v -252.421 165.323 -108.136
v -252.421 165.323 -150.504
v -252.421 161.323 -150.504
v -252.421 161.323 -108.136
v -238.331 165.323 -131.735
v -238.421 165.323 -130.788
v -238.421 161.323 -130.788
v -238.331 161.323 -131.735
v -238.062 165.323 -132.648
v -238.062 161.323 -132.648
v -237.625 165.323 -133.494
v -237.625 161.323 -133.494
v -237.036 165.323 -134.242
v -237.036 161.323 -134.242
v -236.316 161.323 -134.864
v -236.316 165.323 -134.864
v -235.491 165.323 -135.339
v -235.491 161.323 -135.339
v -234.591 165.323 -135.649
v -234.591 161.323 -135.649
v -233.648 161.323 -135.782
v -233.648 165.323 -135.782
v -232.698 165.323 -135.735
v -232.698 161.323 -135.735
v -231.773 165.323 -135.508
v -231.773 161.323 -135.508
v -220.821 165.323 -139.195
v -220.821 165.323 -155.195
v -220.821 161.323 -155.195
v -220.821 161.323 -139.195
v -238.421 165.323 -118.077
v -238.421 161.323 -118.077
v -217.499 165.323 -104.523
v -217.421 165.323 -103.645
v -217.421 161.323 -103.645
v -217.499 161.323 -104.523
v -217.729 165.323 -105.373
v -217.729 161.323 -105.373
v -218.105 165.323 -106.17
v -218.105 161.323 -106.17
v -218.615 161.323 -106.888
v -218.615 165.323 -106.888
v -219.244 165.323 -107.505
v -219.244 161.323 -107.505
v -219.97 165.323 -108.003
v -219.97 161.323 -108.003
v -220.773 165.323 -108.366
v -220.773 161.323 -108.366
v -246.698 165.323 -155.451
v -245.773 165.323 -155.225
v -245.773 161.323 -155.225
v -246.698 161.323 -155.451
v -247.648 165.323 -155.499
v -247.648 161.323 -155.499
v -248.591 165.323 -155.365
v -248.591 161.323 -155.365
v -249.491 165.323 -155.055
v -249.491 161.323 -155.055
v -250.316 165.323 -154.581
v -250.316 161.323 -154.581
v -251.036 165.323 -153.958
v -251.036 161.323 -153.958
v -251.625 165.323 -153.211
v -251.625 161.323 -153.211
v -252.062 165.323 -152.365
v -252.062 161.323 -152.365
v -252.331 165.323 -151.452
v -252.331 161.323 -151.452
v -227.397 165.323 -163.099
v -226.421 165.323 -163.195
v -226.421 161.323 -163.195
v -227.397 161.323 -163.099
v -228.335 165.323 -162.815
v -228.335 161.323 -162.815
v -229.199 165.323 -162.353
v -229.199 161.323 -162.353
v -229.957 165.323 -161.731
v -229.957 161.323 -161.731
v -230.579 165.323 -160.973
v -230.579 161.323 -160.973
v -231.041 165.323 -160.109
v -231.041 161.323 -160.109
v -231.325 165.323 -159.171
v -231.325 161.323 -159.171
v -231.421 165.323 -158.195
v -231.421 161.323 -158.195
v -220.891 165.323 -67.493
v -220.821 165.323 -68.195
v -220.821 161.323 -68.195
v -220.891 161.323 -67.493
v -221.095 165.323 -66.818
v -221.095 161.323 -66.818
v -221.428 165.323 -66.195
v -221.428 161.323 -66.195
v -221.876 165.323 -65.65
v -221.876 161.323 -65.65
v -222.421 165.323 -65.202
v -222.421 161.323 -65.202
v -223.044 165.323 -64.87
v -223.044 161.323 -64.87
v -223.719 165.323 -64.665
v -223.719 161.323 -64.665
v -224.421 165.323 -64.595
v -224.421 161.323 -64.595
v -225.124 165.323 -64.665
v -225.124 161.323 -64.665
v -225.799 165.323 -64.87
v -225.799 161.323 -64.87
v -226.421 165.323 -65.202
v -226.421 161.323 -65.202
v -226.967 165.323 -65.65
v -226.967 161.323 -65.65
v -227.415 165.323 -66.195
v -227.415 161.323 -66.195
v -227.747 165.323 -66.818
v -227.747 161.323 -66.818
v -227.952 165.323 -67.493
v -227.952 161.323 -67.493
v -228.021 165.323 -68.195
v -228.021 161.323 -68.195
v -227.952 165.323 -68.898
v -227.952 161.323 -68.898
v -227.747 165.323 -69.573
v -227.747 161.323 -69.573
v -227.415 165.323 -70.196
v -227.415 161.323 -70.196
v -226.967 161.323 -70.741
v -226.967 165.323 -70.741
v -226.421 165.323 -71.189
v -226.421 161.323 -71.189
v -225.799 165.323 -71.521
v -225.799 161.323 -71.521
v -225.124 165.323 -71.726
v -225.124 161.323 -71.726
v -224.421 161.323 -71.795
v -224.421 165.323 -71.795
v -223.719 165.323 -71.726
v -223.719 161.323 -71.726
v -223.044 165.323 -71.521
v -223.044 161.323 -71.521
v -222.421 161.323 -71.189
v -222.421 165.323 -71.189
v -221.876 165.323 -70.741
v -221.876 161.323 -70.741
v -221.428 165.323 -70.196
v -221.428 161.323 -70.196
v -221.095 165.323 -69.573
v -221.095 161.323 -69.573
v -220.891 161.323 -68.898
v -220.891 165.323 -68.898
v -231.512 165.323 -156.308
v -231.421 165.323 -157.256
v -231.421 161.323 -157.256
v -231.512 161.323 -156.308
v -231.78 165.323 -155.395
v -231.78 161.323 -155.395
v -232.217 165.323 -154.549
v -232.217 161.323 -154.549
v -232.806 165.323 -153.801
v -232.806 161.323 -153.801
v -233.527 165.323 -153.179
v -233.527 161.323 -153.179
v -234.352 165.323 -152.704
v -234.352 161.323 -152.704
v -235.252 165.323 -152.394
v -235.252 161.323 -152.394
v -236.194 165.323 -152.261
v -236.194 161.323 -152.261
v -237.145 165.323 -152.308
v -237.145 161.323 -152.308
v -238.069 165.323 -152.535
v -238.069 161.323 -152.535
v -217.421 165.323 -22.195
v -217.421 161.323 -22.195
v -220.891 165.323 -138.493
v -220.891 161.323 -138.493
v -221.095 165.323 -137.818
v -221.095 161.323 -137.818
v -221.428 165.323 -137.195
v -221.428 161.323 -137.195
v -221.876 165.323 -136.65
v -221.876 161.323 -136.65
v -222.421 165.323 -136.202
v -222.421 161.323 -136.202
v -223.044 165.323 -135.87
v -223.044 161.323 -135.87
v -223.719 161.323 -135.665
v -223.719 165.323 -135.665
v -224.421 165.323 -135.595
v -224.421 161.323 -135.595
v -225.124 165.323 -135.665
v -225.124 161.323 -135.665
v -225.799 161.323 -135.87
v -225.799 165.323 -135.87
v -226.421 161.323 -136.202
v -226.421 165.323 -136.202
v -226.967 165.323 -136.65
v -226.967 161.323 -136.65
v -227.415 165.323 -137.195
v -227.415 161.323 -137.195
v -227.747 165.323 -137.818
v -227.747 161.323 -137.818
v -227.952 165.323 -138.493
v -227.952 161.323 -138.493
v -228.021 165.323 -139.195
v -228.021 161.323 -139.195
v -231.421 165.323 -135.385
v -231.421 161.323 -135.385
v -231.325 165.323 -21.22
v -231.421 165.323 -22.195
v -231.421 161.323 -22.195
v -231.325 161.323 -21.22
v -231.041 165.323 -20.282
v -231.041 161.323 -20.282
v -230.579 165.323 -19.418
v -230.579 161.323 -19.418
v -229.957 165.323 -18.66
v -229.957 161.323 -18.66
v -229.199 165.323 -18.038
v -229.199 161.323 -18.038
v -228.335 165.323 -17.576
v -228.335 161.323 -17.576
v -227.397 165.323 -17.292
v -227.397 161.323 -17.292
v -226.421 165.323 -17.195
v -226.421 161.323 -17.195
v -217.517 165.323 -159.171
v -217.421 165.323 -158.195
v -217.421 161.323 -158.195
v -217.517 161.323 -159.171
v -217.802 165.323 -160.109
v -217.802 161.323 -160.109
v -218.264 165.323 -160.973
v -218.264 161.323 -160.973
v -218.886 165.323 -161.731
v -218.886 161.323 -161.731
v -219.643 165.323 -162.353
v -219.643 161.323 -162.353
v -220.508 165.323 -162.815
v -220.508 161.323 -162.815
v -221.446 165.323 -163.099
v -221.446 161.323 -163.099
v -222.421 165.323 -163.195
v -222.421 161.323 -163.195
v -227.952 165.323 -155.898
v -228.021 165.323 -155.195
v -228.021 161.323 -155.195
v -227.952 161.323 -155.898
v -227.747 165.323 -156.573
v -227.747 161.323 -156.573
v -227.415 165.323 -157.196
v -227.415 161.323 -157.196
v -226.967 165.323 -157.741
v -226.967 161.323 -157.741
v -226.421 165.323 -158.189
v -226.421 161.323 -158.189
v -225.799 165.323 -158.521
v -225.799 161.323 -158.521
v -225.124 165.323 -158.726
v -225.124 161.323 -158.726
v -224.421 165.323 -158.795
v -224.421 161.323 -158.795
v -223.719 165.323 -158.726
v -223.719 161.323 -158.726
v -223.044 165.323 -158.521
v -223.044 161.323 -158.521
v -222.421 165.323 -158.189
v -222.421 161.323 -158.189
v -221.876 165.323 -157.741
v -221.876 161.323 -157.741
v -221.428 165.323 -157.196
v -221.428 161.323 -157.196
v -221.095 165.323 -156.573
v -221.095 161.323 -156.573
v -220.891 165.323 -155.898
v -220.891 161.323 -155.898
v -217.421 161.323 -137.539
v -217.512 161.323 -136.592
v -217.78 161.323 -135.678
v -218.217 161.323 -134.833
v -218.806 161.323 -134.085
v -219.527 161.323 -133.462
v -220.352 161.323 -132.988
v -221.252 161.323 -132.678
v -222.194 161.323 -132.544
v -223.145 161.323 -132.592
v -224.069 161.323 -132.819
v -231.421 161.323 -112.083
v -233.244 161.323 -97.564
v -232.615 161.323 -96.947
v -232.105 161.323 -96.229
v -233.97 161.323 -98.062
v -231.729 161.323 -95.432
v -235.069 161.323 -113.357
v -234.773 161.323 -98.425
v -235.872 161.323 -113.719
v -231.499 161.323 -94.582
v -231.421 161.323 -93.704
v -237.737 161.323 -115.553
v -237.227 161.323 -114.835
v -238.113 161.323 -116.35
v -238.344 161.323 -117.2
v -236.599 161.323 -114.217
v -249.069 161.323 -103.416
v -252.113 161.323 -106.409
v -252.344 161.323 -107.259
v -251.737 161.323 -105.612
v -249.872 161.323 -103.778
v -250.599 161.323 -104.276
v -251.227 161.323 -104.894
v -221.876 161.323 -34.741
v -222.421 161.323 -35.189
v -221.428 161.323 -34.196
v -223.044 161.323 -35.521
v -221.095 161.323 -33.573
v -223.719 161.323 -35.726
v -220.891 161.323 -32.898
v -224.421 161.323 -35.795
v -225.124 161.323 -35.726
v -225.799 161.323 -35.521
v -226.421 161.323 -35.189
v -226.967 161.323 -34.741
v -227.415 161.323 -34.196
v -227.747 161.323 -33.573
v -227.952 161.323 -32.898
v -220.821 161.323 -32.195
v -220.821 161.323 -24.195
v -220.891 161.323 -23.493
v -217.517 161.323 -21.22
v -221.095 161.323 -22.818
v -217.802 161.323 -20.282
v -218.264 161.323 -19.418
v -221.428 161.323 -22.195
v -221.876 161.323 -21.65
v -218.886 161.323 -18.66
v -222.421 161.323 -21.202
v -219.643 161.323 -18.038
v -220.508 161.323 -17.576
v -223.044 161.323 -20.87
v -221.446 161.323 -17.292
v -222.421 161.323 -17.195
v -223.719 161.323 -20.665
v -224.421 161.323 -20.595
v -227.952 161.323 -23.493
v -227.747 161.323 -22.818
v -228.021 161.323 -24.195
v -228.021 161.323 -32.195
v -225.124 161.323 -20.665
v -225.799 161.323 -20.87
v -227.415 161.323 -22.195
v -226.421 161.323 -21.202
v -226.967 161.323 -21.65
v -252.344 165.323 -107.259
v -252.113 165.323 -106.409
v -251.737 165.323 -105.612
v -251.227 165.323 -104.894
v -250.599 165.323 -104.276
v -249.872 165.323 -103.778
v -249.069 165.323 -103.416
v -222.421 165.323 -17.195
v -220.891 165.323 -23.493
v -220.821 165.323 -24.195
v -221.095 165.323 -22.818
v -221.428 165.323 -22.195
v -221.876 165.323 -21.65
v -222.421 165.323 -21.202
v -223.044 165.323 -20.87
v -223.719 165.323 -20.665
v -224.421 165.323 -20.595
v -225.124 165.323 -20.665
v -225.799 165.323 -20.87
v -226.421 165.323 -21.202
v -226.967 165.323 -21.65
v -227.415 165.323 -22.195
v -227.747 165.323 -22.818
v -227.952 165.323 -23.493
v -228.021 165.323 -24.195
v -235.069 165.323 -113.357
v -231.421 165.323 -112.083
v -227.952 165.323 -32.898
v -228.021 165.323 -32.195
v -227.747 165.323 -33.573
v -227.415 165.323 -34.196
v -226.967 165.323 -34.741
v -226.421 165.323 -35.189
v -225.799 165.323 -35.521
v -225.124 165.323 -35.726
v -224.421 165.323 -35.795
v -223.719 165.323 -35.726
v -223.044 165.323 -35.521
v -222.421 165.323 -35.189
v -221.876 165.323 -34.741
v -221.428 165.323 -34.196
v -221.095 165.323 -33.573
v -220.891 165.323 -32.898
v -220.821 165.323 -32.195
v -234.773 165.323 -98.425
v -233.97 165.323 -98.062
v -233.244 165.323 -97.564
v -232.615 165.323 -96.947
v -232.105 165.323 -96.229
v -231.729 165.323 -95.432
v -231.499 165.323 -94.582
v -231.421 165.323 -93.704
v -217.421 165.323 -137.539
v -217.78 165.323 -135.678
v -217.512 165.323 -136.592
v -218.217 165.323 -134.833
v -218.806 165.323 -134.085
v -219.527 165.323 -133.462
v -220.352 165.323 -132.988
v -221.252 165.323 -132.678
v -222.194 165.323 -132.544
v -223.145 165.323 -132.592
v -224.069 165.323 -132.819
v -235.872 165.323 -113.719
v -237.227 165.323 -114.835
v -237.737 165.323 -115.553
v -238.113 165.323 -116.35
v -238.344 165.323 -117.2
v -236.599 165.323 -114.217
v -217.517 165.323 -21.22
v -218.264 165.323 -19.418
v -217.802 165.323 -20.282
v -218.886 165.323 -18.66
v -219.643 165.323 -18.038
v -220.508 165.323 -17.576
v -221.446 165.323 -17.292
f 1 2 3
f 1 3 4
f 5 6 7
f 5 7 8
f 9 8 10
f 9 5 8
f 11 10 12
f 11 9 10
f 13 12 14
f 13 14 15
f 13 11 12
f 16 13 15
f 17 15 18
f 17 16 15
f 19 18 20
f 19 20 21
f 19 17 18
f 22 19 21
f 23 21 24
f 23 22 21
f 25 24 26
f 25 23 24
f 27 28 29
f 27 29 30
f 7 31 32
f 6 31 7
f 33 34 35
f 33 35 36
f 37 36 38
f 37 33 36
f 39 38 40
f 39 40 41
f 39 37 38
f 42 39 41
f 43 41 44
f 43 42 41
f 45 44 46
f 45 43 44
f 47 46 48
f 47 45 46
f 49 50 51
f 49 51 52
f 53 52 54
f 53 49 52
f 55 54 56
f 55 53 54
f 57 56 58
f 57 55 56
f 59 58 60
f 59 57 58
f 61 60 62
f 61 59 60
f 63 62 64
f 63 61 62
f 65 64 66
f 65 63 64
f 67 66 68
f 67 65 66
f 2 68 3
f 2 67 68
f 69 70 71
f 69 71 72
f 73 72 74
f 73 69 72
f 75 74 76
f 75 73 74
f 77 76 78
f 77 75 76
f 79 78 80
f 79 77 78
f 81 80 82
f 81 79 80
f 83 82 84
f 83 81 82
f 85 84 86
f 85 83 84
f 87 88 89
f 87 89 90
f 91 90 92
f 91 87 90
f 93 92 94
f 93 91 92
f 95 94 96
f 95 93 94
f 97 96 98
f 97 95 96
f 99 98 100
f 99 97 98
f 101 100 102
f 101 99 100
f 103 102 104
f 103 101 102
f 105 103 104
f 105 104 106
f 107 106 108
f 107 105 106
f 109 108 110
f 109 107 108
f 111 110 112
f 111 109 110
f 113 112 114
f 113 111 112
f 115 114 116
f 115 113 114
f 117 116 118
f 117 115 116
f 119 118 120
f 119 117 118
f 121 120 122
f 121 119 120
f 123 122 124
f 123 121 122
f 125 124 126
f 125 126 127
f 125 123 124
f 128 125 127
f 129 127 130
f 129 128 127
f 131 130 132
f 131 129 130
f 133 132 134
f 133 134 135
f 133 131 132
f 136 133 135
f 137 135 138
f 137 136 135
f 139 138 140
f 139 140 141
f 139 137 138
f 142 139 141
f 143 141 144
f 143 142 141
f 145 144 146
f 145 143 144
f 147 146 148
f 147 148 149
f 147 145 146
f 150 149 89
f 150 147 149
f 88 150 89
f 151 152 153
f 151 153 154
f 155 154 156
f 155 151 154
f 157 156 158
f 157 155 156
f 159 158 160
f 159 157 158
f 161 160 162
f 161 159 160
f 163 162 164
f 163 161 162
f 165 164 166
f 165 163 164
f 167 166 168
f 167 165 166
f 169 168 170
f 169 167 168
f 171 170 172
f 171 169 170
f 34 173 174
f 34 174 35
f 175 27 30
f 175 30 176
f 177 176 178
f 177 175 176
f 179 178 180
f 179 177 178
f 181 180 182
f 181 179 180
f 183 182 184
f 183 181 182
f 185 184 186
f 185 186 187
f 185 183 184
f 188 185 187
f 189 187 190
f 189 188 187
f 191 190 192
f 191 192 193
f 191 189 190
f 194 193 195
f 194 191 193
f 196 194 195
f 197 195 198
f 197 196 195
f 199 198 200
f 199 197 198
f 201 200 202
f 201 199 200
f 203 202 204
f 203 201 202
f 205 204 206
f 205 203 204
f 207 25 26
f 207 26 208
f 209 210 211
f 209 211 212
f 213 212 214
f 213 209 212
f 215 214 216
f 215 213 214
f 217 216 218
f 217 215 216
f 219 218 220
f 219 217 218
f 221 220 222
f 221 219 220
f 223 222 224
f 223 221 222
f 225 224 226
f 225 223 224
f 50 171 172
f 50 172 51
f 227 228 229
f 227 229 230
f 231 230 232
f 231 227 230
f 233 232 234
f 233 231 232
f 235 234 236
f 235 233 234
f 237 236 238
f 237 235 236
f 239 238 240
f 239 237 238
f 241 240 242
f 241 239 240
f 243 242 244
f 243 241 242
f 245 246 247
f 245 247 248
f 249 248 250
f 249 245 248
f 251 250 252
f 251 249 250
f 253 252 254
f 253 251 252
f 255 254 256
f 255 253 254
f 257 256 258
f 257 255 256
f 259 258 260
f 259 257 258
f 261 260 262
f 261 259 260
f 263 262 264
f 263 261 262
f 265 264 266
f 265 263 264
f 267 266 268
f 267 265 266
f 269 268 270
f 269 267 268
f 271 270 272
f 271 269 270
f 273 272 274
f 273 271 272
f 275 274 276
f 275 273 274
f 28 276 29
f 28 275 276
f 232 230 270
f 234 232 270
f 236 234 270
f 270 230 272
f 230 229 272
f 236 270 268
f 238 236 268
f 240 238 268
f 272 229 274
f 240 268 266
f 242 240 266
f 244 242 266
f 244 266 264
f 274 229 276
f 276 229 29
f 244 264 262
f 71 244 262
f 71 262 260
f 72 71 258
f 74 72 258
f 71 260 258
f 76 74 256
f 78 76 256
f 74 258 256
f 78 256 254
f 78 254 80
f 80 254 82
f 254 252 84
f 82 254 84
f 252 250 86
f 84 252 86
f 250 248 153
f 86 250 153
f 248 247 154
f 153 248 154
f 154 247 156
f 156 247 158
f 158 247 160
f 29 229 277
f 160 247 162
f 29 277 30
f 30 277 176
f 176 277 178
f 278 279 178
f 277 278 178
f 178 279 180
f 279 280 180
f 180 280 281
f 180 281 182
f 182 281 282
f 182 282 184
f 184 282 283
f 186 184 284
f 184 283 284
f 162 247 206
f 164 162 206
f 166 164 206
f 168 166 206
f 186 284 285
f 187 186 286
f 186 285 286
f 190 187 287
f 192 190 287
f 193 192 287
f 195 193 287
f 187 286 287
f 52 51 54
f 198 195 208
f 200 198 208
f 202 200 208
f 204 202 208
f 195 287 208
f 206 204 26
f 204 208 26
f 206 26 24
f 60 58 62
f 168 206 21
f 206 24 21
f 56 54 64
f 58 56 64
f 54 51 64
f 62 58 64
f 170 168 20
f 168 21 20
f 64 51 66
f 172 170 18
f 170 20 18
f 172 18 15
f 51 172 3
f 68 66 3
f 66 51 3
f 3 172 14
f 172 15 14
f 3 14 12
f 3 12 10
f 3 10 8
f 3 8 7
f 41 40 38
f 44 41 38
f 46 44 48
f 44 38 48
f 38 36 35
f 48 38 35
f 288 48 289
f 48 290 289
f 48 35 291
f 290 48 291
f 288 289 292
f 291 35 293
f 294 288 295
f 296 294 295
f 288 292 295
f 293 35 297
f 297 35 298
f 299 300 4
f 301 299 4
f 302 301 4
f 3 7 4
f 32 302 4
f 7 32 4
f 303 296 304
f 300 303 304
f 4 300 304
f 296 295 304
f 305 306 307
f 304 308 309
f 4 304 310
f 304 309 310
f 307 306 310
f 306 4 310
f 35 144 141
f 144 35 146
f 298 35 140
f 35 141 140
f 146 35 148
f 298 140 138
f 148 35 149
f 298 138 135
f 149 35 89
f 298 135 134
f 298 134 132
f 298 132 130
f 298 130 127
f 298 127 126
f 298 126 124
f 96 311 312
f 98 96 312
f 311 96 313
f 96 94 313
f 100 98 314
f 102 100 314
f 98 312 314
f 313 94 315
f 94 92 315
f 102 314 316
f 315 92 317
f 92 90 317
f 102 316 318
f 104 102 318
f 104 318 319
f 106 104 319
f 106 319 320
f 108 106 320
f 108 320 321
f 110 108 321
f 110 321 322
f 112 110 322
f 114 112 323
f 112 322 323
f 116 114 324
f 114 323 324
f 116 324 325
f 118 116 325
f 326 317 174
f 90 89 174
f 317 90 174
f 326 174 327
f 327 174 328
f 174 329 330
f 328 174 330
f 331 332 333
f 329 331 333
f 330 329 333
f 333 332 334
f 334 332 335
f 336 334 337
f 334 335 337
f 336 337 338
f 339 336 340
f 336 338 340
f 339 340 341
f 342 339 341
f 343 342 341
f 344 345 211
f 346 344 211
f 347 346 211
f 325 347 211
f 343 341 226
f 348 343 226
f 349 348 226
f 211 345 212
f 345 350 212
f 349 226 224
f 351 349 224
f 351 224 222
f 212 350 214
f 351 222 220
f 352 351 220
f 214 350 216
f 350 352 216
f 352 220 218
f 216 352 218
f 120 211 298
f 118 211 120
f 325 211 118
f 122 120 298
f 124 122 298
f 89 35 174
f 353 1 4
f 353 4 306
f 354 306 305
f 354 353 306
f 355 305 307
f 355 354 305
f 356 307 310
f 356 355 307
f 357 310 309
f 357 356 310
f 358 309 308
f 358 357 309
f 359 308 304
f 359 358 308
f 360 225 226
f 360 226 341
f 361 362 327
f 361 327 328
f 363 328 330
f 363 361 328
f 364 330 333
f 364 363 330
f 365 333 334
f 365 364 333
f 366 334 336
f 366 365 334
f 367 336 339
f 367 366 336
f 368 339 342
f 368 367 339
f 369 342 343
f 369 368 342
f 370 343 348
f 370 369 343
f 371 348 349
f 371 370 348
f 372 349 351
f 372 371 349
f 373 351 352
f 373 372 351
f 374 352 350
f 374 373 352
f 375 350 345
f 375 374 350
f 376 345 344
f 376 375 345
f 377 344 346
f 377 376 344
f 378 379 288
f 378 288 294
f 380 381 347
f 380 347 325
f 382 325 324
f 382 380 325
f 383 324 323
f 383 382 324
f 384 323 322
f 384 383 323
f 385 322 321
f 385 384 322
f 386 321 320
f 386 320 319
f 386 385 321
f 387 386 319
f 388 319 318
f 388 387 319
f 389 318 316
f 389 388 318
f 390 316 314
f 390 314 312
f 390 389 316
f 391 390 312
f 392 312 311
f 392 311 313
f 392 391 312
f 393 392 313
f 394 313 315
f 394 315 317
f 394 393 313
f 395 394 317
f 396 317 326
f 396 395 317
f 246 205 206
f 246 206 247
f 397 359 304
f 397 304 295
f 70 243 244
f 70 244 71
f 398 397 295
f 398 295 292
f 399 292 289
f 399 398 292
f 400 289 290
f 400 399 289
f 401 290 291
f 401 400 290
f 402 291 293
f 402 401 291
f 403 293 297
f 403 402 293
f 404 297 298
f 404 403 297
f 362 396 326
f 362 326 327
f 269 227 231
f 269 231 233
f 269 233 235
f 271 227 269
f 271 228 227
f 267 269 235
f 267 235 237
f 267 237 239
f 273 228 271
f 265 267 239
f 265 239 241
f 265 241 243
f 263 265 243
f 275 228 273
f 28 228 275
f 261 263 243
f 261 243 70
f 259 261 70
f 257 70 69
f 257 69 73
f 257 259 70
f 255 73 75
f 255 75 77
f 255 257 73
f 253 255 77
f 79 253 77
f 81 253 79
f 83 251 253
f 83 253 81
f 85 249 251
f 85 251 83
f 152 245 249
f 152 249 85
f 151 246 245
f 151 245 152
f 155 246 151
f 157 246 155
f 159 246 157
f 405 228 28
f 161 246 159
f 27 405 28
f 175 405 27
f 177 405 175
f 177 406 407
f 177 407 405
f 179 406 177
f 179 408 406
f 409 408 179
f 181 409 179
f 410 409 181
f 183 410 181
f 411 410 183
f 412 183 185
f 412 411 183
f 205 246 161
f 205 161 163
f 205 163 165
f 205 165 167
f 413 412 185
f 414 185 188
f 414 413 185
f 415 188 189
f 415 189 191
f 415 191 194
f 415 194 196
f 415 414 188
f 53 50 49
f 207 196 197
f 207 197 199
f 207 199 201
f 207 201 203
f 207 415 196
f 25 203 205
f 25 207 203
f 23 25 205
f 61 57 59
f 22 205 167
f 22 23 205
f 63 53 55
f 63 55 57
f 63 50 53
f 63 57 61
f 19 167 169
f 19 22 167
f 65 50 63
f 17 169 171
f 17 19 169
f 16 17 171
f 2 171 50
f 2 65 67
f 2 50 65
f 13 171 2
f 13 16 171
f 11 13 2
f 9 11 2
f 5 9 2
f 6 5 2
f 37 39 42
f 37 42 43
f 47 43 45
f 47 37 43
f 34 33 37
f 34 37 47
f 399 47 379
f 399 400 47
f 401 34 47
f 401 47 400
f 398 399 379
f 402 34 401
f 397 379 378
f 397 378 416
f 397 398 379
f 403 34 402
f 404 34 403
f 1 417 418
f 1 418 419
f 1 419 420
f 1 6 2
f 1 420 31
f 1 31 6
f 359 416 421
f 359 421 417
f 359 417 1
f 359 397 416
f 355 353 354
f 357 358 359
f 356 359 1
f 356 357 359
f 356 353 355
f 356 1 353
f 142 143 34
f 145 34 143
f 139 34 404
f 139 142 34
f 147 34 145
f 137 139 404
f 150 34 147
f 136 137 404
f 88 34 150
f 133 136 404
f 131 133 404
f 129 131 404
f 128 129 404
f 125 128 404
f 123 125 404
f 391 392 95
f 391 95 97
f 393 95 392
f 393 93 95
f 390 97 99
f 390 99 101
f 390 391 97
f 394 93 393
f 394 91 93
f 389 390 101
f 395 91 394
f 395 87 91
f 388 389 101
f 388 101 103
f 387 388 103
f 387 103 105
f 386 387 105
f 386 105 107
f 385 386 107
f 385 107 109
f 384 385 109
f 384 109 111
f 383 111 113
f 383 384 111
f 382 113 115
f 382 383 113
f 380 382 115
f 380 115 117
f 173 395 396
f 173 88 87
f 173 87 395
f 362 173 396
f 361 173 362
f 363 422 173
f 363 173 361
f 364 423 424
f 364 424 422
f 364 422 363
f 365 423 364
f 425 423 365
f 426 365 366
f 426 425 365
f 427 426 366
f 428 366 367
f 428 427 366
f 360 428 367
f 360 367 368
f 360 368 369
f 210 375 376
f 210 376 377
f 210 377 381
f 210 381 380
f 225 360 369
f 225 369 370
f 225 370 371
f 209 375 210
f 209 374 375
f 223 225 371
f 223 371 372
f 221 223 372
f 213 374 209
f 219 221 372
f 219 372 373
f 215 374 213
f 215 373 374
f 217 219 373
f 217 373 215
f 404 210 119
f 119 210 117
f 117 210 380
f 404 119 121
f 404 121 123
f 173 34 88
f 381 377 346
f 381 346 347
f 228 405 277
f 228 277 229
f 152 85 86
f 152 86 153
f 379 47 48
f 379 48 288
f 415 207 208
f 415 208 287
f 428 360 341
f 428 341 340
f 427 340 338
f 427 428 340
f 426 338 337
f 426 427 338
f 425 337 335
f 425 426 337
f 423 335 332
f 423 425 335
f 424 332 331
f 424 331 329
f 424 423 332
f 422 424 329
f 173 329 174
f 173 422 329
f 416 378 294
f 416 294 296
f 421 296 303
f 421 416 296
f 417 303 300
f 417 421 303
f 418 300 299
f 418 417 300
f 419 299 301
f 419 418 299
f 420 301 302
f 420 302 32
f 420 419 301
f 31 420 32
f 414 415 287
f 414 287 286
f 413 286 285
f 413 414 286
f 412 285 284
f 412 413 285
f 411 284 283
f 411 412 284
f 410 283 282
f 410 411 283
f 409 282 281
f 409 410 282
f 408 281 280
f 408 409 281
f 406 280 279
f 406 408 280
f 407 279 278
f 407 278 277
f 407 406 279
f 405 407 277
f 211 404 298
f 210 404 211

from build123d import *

# Parameters (mm, degrees)
SKETCH_1_R      = 3.6
EXTRUDE_1_DEPTH = 4


with BuildPart() as part:
    # Эскиз1 → Бобышка-Вытянуть1 (new body)
    with BuildSketch(Plane.XZ.offset(-165.322557711)):
        with BuildLine():
            Line((-231.421328736, -112.083155458), (-235.069374415, -113.356756687))
            ThreePointArc((-235.069374415, -113.356756687), (-237.498106164, -115.18254085), (-238.421328736, -118.077344091))
            Line((-238.421328736, -118.077344091), (-238.421328736, -130.787626703))
            ThreePointArc((-238.421328736, -130.787626703), (-236.316131977, -134.864404131), (-231.773283057, -135.508214107))
            Line((-231.773283057, -135.508214107), (-231.421328736, -135.385340246))
            Line((-231.421328736, -135.385340246), (-224.069374415, -132.81863498))
            ThreePointArc((-224.069374415, -132.81863498), (-219.526525495, -133.462444956), (-217.421328736, -137.539222384))
            Line((-217.421328736, -137.539222384), (-217.421328736, -158.195492647))
            ThreePointArc((-217.421328736, -158.195492647), (-218.88579483, -161.731026553), (-222.421328736, -163.195492647))
            Line((-222.421328736, -163.195492647), (-226.421328736, -163.195492647))
            ThreePointArc((-226.421328736, -163.195492647), (-229.956862642, -161.731026553), (-231.421328736, -158.195492647))
            Line((-231.421328736, -158.195492647), (-231.421328736, -157.255548243))
            ThreePointArc((-231.421328736, -157.255548243), (-233.526525495, -153.178770815), (-238.069374415, -152.534960839))
            Line((-238.069374415, -152.534960839), (-245.773283057, -155.224539965))
            ThreePointArc((-245.773283057, -155.224539965), (-250.316131977, -154.580729989), (-252.421328736, -150.503952561))
            Line((-252.421328736, -150.503952561), (-252.421328736, -108.136343856))
            ThreePointArc((-252.421328736, -108.136343856), (-251.498106164, -105.241540615), (-249.069374415, -103.415756451))
            Line((-249.069374415, -103.415756451), (-234.773283057, -98.424722589))
            ThreePointArc((-234.773283057, -98.424722589), (-232.344551308, -96.598938425), (-231.421328736, -93.704135185))
            Line((-231.421328736, -93.704135185), (-231.421328736, -22.195492647))
            ThreePointArc((-231.421328736, -22.195492647), (-229.956862642, -18.659958741), (-226.421328736, -17.195492647))
            Line((-226.421328736, -17.195492647), (-222.421328736, -17.195492647))
            ThreePointArc((-222.421328736, -17.195492647), (-218.88579483, -18.659958741), (-217.421328736, -22.195492647))
            Line((-217.421328736, -22.195492647), (-217.421328736, -103.64513542))
            ThreePointArc((-217.421328736, -103.64513542), (-218.344551308, -106.539938661), (-220.773283057, -108.365722824))
            Line((-220.773283057, -108.365722824), (-231.421328736, -112.083155458))
        make_face()
        with Locations((-224.421328736, -68.195492647)):
            Circle(SKETCH_1_R, mode=Mode.SUBTRACT)
        with BuildLine():
            Line((-228.021328736, -139.195492647), (-228.021328736, -155.195492647))
            ThreePointArc((-228.021328736, -155.195492647), (-224.421328736, -158.795492647), (-220.821328736, -155.195492647))
            Line((-220.821328736, -155.195492647), (-220.821328736, -139.195492647))
            ThreePointArc((-220.821328736, -139.195492647), (-224.421328736, -135.595492647), (-228.021328736, -139.195492647))
        make_face(mode=Mode.SUBTRACT)
        with BuildLine():
            Line((-228.021328736, -24.195492647), (-228.021328736, -32.195492647))
            ThreePointArc((-228.021328736, -32.195492647), (-224.421328736, -35.795492647), (-220.821328736, -32.195492647))
            Line((-220.821328736, -32.195492647), (-220.821328736, -24.195492647))
            ThreePointArc((-220.821328736, -24.195492647), (-224.421328736, -20.595492647), (-228.021328736, -24.195492647))
        make_face(mode=Mode.SUBTRACT)
    extrude(amount=EXTRUDE_1_DEPTH)


solid = part.part
